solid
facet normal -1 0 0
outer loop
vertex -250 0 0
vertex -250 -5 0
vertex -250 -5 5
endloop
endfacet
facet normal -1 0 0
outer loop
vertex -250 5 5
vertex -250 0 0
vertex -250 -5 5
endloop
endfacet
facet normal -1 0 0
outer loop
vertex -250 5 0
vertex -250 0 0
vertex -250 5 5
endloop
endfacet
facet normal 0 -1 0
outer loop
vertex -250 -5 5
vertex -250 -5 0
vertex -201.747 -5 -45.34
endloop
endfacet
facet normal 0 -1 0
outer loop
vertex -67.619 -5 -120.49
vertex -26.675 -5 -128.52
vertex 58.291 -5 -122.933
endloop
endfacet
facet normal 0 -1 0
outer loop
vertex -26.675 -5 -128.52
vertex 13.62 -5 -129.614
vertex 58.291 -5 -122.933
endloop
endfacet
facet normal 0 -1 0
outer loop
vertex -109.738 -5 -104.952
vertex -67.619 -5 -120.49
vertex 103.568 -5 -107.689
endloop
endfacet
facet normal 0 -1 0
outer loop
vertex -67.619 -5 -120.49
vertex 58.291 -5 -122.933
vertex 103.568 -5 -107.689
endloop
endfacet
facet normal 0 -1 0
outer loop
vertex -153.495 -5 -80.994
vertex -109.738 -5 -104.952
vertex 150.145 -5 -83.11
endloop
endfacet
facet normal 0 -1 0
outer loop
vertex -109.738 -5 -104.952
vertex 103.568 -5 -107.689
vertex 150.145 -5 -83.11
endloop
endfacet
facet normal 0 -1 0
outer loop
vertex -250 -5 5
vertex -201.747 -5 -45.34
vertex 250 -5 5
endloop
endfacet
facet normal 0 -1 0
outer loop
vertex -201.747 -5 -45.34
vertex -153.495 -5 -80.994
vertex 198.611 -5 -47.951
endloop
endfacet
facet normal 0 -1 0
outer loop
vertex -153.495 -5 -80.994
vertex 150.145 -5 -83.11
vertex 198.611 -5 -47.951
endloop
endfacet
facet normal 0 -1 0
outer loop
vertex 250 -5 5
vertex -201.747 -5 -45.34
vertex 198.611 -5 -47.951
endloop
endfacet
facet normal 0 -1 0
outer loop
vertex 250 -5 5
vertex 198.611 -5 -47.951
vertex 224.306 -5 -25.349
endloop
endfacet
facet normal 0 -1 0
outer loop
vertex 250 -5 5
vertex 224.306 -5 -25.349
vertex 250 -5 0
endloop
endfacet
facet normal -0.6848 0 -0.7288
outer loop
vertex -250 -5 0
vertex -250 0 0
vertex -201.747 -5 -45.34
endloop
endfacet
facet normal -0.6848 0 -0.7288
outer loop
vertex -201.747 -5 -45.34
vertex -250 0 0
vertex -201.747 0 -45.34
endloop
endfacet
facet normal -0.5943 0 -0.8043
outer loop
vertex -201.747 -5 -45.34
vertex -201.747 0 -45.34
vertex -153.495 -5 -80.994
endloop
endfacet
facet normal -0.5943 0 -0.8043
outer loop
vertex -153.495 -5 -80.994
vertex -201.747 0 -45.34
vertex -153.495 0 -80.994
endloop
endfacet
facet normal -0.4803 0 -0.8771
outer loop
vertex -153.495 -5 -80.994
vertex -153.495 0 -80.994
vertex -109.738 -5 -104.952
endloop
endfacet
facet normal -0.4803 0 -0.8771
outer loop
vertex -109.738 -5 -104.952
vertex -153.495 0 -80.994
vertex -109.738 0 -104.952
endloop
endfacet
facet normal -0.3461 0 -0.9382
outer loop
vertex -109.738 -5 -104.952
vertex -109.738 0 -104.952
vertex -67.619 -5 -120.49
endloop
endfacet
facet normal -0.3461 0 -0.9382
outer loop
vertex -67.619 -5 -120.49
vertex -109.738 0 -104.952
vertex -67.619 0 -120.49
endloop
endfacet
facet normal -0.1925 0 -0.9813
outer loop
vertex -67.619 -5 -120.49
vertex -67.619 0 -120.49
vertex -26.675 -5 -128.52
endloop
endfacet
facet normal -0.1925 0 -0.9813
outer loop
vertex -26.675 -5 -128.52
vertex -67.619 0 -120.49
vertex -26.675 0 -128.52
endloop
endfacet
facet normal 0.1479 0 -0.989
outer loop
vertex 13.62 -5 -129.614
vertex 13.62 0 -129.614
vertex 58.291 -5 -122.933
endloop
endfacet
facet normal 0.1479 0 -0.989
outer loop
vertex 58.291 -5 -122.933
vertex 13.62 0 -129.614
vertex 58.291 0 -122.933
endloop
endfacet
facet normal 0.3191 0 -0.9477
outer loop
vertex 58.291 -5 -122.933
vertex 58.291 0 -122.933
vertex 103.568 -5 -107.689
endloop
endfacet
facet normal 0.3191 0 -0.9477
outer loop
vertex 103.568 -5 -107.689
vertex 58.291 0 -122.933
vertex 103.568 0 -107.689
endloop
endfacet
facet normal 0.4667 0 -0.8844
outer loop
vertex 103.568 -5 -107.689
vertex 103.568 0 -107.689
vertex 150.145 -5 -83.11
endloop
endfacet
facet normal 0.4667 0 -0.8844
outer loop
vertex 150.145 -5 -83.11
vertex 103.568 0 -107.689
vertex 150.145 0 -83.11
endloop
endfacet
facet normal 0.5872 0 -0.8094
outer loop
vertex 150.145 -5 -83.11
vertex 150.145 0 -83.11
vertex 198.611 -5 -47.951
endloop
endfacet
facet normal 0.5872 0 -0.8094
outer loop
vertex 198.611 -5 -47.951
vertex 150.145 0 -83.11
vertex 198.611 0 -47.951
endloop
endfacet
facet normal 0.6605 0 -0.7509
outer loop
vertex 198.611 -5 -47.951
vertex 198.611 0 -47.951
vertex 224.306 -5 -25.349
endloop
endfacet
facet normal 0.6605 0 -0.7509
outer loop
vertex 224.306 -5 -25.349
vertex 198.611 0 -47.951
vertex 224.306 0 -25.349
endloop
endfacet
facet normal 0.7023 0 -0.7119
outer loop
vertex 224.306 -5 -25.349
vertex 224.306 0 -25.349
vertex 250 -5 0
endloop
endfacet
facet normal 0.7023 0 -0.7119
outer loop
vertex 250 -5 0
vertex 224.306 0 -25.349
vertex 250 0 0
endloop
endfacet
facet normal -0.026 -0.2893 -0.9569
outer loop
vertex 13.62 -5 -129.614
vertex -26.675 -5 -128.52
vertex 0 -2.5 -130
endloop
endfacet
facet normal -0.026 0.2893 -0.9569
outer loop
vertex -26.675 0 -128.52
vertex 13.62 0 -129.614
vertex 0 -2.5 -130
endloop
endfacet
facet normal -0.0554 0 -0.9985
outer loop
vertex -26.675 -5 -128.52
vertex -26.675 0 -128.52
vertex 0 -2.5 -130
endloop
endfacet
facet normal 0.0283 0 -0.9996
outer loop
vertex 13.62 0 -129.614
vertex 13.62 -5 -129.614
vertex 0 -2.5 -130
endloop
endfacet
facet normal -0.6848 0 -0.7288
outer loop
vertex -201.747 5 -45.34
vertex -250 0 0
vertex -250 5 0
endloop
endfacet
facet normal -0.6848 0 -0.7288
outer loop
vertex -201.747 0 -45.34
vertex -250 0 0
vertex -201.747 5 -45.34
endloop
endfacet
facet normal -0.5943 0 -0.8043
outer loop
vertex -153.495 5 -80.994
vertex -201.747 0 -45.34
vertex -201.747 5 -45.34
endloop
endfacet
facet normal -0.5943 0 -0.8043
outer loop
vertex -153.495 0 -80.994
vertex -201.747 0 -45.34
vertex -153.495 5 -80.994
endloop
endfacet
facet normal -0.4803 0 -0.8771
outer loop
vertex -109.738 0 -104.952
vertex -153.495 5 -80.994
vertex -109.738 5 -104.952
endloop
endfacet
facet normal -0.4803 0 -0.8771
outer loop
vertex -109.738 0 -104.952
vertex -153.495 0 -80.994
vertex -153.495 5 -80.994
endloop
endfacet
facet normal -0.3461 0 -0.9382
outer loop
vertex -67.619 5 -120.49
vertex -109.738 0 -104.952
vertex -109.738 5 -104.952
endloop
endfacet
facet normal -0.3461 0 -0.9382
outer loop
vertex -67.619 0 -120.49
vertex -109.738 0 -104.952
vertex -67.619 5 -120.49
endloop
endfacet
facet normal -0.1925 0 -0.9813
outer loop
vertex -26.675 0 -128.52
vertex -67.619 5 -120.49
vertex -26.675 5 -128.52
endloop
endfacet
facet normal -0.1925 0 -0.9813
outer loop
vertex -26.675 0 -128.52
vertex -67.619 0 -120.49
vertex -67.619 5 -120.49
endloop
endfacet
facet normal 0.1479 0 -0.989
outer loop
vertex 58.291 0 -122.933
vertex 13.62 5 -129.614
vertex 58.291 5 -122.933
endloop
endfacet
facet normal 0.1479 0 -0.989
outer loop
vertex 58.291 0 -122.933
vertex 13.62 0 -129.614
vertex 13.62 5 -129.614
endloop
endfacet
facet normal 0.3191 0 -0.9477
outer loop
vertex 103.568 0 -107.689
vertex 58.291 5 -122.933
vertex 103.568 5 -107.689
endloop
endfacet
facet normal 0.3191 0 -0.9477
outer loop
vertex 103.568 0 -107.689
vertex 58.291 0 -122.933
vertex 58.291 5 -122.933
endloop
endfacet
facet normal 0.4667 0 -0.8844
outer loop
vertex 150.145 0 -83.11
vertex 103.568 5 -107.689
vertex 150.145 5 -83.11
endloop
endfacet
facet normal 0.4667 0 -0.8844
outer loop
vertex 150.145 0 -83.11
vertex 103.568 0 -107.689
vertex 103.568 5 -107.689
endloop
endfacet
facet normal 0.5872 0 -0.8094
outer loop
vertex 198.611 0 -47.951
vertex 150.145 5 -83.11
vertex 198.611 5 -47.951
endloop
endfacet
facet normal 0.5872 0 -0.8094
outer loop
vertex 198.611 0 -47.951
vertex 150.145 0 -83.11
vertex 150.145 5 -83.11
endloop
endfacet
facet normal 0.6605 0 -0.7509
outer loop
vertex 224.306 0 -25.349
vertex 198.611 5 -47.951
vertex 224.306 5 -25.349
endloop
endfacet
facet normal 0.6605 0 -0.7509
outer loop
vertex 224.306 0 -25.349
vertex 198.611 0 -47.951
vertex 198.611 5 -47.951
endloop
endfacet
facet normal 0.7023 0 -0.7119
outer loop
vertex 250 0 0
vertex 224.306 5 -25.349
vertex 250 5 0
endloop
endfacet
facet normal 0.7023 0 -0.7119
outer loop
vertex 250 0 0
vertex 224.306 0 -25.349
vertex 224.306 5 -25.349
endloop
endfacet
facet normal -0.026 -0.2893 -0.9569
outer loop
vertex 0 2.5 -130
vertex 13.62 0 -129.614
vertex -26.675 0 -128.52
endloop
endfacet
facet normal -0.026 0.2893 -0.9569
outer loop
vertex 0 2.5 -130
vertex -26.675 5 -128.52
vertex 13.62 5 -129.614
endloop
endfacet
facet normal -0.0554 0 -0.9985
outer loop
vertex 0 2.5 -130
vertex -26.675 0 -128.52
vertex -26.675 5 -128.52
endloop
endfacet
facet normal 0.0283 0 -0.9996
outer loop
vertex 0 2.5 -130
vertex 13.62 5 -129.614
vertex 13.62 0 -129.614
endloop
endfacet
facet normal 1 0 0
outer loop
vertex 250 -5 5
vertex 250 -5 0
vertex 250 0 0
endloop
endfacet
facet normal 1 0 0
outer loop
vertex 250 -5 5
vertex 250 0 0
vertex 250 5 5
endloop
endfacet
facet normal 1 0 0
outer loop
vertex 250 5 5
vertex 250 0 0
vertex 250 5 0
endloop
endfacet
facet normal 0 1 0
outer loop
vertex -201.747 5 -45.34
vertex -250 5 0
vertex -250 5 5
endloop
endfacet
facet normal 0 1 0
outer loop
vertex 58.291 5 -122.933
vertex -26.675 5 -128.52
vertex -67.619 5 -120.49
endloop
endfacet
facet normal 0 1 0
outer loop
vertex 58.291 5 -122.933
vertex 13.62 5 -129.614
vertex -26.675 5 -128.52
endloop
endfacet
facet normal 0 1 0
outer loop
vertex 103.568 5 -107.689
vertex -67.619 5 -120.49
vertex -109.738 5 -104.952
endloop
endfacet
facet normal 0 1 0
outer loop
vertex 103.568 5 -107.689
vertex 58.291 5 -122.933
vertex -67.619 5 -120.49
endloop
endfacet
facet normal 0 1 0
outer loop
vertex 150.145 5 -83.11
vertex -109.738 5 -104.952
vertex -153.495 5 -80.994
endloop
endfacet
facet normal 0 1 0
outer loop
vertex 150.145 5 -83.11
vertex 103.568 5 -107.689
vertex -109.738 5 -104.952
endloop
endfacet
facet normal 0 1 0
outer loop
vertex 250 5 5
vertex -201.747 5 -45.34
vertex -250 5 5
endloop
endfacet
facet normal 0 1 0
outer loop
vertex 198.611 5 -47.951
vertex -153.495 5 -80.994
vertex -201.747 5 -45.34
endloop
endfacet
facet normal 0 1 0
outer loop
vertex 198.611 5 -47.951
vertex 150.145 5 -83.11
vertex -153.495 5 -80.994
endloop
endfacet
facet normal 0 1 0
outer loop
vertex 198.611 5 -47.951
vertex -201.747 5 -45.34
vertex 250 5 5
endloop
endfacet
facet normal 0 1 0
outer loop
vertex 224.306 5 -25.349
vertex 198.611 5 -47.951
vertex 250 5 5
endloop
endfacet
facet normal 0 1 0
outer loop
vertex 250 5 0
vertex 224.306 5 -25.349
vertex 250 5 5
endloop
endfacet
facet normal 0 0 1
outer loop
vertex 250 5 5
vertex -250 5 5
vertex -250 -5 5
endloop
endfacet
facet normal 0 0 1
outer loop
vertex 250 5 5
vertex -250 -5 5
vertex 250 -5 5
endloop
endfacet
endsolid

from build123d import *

# Parameters (mm, degrees)
EXTRUDE_3_DEPTH = 5
EXTRUDE_4_DEPTH = 5
SKETCH_4_W      = 500
SKETCH_4_H      = 10
EXTRUDE_5_DEPTH = 5


with BuildPart() as part:
    # 草图1 → 凸台-拉伸3 (new body)
    with BuildSketch(Plane(origin=(0, 0, 0), x_dir=(1, 0, 0), z_dir=(0, 1, 0))):
        with BuildLine():
            Line((0, 0), (-250, 0))
            add(Edge.make_bspline(
                [(-250, 0), (0, 260), (250, 0)],
                knots=[0, 0, 0, 1, 1, 1], degree=2))
            Line((250, 0), (0, 0))
        make_face()
    extrude(amount=EXTRUDE_3_DEPTH)

    # 草图3 → 凸台-拉伸4 (add)
    with BuildSketch(Plane.XZ):
        with BuildLine():
            Line((-250, 0), (250, 0))
            add(Edge.make_bspline(
                [(-250, 0), (-1e-09, -260), (250, 0)],
                knots=[0, 0, 0, 1, 1, 1], degree=2))
        make_face()
    extrude(amount=EXTRUDE_4_DEPTH)

    # 草图4 → 凸台-拉伸5 (add)
    with BuildSketch(Plane.XY):
        Rectangle(SKETCH_4_W, SKETCH_4_H)
    extrude(amount=EXTRUDE_5_DEPTH)


solid = part.part
